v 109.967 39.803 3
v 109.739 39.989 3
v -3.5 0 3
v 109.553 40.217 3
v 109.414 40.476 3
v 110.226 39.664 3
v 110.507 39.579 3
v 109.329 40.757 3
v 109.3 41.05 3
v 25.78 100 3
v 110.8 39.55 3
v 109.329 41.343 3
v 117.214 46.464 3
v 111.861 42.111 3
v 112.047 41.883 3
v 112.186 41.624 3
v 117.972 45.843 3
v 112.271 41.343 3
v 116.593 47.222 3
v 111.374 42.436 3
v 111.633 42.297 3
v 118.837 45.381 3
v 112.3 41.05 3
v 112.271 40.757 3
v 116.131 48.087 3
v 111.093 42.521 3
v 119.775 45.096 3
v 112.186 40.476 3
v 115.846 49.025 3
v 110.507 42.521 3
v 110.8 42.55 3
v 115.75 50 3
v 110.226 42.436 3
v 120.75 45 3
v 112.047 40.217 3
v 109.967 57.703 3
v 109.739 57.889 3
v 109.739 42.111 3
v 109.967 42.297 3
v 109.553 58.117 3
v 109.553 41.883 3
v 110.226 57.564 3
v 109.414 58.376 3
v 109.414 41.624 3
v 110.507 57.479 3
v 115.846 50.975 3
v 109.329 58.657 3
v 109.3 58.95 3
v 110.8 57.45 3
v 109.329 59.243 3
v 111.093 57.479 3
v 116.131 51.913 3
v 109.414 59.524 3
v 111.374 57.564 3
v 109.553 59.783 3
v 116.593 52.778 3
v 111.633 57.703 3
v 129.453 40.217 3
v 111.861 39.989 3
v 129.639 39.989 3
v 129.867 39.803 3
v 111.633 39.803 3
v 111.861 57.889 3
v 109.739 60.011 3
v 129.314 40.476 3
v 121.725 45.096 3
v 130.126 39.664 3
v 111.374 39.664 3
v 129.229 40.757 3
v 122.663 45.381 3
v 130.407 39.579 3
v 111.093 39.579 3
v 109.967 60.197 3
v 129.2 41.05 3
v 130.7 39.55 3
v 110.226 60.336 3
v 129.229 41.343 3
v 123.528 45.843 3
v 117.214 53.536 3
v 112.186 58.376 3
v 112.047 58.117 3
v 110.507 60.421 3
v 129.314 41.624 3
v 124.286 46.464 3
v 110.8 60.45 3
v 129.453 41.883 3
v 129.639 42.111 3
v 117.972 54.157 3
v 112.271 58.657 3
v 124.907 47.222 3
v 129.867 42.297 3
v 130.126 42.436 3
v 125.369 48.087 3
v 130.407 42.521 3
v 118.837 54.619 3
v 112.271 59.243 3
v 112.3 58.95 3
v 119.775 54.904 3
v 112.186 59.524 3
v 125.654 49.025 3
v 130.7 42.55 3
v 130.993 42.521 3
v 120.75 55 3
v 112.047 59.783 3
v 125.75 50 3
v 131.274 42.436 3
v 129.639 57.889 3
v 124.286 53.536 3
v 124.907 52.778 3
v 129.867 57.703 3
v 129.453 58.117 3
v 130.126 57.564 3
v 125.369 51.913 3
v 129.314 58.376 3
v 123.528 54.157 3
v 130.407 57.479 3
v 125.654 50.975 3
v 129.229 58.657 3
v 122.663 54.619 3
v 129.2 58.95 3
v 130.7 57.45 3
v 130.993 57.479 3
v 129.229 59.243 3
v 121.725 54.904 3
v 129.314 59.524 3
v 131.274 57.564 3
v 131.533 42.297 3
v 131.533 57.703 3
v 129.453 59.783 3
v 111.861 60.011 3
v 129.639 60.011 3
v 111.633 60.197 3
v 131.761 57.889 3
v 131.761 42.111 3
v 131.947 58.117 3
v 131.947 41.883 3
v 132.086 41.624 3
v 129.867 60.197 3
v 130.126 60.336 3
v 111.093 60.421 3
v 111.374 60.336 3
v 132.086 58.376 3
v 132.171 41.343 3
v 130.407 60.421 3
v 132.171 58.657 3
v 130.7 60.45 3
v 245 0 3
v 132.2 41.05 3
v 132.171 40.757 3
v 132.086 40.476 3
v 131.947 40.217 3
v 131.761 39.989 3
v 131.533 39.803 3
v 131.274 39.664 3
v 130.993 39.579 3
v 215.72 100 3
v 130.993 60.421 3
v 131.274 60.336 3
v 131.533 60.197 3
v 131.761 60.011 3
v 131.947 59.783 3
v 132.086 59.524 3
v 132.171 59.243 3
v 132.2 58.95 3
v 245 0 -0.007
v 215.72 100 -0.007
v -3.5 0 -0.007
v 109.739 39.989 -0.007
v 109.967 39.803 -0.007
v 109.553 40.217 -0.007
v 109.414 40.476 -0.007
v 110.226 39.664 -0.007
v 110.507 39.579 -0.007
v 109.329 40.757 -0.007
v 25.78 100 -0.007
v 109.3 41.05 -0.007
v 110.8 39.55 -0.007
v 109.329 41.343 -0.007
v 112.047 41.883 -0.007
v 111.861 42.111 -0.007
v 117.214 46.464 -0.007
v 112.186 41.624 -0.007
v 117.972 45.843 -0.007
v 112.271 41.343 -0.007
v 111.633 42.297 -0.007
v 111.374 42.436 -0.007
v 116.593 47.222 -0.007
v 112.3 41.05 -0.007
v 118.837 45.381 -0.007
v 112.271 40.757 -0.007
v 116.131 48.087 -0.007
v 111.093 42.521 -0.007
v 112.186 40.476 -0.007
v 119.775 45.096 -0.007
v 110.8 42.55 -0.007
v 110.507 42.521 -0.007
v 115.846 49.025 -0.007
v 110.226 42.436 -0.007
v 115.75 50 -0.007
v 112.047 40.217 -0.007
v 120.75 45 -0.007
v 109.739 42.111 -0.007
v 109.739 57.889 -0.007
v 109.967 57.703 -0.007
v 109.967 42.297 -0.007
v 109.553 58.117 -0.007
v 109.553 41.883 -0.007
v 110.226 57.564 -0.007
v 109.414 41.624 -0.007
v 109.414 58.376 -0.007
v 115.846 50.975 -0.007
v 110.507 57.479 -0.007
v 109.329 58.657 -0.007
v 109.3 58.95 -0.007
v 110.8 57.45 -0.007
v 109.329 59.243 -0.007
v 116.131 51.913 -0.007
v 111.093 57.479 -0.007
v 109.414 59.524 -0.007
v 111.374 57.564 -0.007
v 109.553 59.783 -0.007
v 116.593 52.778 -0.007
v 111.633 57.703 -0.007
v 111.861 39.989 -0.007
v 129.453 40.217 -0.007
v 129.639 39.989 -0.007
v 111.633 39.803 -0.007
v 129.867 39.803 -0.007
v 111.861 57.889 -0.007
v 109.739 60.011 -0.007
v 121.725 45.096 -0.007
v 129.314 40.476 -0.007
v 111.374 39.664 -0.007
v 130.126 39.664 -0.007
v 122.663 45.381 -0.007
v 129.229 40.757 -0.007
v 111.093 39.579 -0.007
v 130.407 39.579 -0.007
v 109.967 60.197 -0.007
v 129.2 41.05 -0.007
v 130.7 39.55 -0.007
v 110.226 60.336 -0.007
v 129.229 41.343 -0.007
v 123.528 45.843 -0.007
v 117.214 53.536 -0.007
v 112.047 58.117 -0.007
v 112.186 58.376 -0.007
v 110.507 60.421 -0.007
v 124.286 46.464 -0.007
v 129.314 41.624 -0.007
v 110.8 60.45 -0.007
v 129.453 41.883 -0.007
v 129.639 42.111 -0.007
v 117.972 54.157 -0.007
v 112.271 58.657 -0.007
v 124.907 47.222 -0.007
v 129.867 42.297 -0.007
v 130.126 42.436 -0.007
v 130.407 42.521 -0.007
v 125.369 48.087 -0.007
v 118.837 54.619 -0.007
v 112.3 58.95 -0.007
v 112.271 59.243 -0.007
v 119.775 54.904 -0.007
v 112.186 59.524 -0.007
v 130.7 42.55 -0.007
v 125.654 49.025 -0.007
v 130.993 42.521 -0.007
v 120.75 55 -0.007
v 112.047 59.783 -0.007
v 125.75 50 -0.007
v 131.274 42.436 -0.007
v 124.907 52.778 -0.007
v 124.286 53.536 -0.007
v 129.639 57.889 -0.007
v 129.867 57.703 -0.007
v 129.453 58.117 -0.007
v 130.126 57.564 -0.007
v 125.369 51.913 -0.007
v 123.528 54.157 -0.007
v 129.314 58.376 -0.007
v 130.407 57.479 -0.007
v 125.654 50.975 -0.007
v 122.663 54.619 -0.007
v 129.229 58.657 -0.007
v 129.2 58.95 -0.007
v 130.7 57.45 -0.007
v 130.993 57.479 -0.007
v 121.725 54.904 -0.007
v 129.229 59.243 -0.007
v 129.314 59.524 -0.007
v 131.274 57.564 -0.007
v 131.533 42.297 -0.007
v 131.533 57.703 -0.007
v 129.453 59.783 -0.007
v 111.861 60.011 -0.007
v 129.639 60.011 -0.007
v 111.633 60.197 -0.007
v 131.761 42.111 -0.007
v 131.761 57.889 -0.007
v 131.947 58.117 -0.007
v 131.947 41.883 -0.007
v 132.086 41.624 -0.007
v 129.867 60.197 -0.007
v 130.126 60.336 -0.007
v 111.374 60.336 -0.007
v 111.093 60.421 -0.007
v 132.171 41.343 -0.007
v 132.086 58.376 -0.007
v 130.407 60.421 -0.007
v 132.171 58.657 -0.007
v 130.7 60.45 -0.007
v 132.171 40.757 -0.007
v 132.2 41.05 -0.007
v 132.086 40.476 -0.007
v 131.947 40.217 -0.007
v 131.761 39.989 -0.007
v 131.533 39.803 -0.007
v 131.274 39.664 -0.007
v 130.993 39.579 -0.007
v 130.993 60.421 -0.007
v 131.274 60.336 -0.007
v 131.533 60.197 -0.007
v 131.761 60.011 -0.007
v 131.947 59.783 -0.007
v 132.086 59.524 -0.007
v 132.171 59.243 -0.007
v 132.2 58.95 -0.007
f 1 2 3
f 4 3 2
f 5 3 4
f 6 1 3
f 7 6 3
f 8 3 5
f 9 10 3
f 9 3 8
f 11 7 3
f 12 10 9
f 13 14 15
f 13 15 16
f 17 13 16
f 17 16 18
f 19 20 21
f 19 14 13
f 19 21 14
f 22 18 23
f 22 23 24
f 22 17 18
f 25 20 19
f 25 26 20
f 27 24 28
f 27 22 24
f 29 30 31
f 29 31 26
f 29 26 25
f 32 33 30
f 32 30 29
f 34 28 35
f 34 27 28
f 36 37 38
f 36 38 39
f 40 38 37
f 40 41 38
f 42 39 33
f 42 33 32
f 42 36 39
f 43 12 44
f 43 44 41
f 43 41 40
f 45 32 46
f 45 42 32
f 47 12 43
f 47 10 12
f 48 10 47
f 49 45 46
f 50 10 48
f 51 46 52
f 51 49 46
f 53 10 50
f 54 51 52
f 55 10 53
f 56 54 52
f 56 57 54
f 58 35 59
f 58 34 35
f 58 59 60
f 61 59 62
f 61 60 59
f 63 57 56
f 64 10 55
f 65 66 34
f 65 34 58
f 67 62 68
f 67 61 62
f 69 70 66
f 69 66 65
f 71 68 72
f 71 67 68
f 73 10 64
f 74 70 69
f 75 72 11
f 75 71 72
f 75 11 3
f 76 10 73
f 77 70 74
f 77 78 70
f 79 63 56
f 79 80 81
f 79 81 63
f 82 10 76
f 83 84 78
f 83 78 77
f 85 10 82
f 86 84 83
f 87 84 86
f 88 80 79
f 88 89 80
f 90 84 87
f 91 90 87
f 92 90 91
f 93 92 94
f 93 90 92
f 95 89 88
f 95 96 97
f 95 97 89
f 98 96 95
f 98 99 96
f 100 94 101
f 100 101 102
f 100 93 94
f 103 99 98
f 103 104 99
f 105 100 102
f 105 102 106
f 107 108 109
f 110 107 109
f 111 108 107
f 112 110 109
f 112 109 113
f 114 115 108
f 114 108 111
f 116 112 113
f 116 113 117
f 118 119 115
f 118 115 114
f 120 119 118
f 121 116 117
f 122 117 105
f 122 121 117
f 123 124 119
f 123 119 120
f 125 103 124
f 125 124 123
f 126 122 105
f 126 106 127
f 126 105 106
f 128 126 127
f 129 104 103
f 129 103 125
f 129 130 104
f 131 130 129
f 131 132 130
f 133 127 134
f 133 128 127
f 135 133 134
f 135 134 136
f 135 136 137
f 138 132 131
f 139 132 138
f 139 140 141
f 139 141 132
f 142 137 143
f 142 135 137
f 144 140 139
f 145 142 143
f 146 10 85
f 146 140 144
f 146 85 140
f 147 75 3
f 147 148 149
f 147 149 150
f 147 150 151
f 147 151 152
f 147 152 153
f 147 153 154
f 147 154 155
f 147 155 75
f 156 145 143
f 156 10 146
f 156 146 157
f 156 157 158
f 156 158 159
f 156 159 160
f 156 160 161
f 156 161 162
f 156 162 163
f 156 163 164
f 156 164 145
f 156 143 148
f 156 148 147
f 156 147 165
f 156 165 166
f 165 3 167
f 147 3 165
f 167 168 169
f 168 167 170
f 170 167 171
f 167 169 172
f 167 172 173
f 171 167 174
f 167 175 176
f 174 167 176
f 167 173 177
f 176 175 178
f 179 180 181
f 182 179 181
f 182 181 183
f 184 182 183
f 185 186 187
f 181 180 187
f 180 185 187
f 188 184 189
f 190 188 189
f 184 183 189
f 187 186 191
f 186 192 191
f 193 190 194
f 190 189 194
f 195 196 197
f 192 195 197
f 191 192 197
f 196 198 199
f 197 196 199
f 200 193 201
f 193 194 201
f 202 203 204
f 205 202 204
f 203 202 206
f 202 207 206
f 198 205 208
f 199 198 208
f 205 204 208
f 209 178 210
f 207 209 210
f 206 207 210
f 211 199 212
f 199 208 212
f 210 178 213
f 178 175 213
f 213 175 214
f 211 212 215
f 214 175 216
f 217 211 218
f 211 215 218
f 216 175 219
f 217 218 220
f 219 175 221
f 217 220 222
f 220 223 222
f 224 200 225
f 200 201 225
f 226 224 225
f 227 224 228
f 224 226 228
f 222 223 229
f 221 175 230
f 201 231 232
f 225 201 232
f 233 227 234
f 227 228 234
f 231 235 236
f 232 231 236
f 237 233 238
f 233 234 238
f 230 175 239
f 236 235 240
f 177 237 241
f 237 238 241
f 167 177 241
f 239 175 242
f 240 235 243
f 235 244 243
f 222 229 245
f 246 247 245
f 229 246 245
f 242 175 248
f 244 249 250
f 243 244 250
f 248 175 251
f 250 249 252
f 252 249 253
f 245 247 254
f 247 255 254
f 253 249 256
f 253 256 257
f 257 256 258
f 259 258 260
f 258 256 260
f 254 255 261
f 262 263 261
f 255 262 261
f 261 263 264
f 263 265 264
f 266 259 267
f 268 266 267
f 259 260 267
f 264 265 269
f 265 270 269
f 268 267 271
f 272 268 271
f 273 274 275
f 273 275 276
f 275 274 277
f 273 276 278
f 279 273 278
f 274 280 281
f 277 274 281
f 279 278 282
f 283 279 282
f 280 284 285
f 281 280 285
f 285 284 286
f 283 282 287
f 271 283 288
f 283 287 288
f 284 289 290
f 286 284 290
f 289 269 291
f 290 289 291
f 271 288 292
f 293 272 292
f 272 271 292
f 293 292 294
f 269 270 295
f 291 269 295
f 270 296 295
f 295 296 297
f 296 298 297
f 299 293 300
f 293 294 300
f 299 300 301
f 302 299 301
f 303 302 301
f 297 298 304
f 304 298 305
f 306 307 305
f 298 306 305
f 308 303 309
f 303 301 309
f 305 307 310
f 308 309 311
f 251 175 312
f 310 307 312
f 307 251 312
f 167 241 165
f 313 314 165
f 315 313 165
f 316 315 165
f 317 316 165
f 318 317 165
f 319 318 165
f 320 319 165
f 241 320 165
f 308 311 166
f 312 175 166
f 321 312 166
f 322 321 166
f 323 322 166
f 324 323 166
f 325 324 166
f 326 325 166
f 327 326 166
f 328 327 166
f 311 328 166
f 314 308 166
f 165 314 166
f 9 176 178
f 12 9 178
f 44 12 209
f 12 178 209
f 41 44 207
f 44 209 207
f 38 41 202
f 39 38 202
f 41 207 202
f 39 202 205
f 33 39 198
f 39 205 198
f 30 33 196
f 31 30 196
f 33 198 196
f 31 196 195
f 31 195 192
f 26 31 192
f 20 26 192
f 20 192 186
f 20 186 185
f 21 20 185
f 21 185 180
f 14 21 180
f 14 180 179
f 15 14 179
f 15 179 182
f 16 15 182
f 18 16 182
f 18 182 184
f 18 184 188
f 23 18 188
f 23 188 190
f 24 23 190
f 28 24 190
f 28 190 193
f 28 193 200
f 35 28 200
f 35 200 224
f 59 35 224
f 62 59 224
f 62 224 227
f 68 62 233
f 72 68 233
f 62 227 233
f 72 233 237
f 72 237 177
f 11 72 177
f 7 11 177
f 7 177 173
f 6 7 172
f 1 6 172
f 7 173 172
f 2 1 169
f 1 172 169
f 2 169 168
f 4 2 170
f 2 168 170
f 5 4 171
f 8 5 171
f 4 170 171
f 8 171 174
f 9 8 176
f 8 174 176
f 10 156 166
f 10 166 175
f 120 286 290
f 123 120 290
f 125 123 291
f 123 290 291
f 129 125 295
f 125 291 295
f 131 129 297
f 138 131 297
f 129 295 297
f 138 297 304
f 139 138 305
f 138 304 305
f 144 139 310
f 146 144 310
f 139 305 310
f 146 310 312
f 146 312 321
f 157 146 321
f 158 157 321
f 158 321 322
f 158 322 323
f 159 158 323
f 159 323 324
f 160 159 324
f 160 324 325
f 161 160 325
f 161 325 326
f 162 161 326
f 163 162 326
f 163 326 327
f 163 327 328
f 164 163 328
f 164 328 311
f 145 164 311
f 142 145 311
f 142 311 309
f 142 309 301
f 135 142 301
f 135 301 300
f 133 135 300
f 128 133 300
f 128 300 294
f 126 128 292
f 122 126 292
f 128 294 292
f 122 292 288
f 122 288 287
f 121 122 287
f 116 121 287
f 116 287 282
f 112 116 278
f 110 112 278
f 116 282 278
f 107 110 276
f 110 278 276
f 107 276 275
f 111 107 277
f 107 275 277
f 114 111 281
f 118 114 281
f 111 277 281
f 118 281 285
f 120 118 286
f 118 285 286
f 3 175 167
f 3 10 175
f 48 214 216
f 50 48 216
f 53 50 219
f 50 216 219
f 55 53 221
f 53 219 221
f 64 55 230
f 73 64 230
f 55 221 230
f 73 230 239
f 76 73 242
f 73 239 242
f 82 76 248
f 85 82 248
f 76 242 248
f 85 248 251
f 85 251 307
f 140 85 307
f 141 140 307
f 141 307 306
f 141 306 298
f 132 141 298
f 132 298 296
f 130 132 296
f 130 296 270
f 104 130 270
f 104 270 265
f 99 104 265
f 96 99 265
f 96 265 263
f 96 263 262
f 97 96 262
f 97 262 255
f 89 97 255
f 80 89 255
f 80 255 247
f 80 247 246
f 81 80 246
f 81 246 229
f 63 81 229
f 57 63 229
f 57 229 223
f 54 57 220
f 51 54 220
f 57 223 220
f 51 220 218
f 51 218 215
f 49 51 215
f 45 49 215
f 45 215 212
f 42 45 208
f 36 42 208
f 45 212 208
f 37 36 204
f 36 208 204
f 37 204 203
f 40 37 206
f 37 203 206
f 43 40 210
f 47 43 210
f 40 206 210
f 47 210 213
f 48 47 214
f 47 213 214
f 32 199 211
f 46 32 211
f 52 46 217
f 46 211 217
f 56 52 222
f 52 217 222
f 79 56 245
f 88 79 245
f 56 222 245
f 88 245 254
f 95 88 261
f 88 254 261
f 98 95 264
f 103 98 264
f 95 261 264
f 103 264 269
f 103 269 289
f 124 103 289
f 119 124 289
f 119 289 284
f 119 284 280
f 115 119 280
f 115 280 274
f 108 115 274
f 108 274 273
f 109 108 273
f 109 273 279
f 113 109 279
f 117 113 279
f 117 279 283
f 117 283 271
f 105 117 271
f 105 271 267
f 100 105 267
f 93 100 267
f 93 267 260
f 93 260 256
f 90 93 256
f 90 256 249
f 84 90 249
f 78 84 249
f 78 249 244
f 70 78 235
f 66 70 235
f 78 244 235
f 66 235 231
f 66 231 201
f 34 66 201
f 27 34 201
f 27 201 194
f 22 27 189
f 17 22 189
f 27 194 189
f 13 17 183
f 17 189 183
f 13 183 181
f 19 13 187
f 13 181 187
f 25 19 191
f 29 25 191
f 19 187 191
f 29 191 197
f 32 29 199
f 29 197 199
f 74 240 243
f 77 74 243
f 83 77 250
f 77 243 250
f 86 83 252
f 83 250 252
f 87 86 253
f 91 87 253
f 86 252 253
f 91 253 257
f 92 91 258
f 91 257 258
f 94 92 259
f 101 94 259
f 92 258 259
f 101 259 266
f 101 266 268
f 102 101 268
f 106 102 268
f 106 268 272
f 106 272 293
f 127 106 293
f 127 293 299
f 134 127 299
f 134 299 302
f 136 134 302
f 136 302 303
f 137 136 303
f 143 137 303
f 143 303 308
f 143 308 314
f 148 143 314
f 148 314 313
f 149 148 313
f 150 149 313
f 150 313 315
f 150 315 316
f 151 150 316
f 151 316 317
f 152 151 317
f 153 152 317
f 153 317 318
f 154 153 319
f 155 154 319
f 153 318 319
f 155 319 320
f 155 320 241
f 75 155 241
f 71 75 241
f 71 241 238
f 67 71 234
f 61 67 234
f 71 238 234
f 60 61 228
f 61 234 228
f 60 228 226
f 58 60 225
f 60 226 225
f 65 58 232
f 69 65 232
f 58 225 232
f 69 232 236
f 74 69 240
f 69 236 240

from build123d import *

# Parameters (mm, degrees)
BOSS_EXTRUDE1_DEPTH        = 3
BOSS_EXTRUDE1_DEPTH_BACK   = 0.006725904
F_10_0MM_DOWEL_HOLE1_D     = 10
F_10_0MM_DOWEL_HOLE1_DEPTH = 3.006725904
F_3_0MM_DOWEL_HOLE1_D      = 3
F_3_0MM_DOWEL_HOLE1_DEPTH  = 3.006725904


with BuildPart() as part:
    # Sketch1 → Boss-Extrude1 (new body, two sides)
    with BuildSketch(Plane.XY) as boss_extrude1_sk:
        Polygon((-3.5, 0), (245, 0), (215.720058283, 100), (25.779941717, 100), align=None)
    extrude(amount=BOSS_EXTRUDE1_DEPTH)
    extrude(boss_extrude1_sk.sketch, amount=-BOSS_EXTRUDE1_DEPTH_BACK)

    # Ø10.0mm Dowel Hole1
    with Locations(Plane.XY.offset(3)):
        with Locations((120.75, 50)):
            Hole(F_10_0MM_DOWEL_HOLE1_D / 2, depth=F_10_0MM_DOWEL_HOLE1_DEPTH)

    # Ø3.0mm Dowel Hole1
    with Locations(Plane.XY.offset(3)):
        with Locations((110.8, 58.95), (130.7, 58.95), (130.7, 41.05), (110.8, 41.05)):
            Hole(F_3_0MM_DOWEL_HOLE1_D / 2, depth=F_3_0MM_DOWEL_HOLE1_DEPTH)


solid = part.part
